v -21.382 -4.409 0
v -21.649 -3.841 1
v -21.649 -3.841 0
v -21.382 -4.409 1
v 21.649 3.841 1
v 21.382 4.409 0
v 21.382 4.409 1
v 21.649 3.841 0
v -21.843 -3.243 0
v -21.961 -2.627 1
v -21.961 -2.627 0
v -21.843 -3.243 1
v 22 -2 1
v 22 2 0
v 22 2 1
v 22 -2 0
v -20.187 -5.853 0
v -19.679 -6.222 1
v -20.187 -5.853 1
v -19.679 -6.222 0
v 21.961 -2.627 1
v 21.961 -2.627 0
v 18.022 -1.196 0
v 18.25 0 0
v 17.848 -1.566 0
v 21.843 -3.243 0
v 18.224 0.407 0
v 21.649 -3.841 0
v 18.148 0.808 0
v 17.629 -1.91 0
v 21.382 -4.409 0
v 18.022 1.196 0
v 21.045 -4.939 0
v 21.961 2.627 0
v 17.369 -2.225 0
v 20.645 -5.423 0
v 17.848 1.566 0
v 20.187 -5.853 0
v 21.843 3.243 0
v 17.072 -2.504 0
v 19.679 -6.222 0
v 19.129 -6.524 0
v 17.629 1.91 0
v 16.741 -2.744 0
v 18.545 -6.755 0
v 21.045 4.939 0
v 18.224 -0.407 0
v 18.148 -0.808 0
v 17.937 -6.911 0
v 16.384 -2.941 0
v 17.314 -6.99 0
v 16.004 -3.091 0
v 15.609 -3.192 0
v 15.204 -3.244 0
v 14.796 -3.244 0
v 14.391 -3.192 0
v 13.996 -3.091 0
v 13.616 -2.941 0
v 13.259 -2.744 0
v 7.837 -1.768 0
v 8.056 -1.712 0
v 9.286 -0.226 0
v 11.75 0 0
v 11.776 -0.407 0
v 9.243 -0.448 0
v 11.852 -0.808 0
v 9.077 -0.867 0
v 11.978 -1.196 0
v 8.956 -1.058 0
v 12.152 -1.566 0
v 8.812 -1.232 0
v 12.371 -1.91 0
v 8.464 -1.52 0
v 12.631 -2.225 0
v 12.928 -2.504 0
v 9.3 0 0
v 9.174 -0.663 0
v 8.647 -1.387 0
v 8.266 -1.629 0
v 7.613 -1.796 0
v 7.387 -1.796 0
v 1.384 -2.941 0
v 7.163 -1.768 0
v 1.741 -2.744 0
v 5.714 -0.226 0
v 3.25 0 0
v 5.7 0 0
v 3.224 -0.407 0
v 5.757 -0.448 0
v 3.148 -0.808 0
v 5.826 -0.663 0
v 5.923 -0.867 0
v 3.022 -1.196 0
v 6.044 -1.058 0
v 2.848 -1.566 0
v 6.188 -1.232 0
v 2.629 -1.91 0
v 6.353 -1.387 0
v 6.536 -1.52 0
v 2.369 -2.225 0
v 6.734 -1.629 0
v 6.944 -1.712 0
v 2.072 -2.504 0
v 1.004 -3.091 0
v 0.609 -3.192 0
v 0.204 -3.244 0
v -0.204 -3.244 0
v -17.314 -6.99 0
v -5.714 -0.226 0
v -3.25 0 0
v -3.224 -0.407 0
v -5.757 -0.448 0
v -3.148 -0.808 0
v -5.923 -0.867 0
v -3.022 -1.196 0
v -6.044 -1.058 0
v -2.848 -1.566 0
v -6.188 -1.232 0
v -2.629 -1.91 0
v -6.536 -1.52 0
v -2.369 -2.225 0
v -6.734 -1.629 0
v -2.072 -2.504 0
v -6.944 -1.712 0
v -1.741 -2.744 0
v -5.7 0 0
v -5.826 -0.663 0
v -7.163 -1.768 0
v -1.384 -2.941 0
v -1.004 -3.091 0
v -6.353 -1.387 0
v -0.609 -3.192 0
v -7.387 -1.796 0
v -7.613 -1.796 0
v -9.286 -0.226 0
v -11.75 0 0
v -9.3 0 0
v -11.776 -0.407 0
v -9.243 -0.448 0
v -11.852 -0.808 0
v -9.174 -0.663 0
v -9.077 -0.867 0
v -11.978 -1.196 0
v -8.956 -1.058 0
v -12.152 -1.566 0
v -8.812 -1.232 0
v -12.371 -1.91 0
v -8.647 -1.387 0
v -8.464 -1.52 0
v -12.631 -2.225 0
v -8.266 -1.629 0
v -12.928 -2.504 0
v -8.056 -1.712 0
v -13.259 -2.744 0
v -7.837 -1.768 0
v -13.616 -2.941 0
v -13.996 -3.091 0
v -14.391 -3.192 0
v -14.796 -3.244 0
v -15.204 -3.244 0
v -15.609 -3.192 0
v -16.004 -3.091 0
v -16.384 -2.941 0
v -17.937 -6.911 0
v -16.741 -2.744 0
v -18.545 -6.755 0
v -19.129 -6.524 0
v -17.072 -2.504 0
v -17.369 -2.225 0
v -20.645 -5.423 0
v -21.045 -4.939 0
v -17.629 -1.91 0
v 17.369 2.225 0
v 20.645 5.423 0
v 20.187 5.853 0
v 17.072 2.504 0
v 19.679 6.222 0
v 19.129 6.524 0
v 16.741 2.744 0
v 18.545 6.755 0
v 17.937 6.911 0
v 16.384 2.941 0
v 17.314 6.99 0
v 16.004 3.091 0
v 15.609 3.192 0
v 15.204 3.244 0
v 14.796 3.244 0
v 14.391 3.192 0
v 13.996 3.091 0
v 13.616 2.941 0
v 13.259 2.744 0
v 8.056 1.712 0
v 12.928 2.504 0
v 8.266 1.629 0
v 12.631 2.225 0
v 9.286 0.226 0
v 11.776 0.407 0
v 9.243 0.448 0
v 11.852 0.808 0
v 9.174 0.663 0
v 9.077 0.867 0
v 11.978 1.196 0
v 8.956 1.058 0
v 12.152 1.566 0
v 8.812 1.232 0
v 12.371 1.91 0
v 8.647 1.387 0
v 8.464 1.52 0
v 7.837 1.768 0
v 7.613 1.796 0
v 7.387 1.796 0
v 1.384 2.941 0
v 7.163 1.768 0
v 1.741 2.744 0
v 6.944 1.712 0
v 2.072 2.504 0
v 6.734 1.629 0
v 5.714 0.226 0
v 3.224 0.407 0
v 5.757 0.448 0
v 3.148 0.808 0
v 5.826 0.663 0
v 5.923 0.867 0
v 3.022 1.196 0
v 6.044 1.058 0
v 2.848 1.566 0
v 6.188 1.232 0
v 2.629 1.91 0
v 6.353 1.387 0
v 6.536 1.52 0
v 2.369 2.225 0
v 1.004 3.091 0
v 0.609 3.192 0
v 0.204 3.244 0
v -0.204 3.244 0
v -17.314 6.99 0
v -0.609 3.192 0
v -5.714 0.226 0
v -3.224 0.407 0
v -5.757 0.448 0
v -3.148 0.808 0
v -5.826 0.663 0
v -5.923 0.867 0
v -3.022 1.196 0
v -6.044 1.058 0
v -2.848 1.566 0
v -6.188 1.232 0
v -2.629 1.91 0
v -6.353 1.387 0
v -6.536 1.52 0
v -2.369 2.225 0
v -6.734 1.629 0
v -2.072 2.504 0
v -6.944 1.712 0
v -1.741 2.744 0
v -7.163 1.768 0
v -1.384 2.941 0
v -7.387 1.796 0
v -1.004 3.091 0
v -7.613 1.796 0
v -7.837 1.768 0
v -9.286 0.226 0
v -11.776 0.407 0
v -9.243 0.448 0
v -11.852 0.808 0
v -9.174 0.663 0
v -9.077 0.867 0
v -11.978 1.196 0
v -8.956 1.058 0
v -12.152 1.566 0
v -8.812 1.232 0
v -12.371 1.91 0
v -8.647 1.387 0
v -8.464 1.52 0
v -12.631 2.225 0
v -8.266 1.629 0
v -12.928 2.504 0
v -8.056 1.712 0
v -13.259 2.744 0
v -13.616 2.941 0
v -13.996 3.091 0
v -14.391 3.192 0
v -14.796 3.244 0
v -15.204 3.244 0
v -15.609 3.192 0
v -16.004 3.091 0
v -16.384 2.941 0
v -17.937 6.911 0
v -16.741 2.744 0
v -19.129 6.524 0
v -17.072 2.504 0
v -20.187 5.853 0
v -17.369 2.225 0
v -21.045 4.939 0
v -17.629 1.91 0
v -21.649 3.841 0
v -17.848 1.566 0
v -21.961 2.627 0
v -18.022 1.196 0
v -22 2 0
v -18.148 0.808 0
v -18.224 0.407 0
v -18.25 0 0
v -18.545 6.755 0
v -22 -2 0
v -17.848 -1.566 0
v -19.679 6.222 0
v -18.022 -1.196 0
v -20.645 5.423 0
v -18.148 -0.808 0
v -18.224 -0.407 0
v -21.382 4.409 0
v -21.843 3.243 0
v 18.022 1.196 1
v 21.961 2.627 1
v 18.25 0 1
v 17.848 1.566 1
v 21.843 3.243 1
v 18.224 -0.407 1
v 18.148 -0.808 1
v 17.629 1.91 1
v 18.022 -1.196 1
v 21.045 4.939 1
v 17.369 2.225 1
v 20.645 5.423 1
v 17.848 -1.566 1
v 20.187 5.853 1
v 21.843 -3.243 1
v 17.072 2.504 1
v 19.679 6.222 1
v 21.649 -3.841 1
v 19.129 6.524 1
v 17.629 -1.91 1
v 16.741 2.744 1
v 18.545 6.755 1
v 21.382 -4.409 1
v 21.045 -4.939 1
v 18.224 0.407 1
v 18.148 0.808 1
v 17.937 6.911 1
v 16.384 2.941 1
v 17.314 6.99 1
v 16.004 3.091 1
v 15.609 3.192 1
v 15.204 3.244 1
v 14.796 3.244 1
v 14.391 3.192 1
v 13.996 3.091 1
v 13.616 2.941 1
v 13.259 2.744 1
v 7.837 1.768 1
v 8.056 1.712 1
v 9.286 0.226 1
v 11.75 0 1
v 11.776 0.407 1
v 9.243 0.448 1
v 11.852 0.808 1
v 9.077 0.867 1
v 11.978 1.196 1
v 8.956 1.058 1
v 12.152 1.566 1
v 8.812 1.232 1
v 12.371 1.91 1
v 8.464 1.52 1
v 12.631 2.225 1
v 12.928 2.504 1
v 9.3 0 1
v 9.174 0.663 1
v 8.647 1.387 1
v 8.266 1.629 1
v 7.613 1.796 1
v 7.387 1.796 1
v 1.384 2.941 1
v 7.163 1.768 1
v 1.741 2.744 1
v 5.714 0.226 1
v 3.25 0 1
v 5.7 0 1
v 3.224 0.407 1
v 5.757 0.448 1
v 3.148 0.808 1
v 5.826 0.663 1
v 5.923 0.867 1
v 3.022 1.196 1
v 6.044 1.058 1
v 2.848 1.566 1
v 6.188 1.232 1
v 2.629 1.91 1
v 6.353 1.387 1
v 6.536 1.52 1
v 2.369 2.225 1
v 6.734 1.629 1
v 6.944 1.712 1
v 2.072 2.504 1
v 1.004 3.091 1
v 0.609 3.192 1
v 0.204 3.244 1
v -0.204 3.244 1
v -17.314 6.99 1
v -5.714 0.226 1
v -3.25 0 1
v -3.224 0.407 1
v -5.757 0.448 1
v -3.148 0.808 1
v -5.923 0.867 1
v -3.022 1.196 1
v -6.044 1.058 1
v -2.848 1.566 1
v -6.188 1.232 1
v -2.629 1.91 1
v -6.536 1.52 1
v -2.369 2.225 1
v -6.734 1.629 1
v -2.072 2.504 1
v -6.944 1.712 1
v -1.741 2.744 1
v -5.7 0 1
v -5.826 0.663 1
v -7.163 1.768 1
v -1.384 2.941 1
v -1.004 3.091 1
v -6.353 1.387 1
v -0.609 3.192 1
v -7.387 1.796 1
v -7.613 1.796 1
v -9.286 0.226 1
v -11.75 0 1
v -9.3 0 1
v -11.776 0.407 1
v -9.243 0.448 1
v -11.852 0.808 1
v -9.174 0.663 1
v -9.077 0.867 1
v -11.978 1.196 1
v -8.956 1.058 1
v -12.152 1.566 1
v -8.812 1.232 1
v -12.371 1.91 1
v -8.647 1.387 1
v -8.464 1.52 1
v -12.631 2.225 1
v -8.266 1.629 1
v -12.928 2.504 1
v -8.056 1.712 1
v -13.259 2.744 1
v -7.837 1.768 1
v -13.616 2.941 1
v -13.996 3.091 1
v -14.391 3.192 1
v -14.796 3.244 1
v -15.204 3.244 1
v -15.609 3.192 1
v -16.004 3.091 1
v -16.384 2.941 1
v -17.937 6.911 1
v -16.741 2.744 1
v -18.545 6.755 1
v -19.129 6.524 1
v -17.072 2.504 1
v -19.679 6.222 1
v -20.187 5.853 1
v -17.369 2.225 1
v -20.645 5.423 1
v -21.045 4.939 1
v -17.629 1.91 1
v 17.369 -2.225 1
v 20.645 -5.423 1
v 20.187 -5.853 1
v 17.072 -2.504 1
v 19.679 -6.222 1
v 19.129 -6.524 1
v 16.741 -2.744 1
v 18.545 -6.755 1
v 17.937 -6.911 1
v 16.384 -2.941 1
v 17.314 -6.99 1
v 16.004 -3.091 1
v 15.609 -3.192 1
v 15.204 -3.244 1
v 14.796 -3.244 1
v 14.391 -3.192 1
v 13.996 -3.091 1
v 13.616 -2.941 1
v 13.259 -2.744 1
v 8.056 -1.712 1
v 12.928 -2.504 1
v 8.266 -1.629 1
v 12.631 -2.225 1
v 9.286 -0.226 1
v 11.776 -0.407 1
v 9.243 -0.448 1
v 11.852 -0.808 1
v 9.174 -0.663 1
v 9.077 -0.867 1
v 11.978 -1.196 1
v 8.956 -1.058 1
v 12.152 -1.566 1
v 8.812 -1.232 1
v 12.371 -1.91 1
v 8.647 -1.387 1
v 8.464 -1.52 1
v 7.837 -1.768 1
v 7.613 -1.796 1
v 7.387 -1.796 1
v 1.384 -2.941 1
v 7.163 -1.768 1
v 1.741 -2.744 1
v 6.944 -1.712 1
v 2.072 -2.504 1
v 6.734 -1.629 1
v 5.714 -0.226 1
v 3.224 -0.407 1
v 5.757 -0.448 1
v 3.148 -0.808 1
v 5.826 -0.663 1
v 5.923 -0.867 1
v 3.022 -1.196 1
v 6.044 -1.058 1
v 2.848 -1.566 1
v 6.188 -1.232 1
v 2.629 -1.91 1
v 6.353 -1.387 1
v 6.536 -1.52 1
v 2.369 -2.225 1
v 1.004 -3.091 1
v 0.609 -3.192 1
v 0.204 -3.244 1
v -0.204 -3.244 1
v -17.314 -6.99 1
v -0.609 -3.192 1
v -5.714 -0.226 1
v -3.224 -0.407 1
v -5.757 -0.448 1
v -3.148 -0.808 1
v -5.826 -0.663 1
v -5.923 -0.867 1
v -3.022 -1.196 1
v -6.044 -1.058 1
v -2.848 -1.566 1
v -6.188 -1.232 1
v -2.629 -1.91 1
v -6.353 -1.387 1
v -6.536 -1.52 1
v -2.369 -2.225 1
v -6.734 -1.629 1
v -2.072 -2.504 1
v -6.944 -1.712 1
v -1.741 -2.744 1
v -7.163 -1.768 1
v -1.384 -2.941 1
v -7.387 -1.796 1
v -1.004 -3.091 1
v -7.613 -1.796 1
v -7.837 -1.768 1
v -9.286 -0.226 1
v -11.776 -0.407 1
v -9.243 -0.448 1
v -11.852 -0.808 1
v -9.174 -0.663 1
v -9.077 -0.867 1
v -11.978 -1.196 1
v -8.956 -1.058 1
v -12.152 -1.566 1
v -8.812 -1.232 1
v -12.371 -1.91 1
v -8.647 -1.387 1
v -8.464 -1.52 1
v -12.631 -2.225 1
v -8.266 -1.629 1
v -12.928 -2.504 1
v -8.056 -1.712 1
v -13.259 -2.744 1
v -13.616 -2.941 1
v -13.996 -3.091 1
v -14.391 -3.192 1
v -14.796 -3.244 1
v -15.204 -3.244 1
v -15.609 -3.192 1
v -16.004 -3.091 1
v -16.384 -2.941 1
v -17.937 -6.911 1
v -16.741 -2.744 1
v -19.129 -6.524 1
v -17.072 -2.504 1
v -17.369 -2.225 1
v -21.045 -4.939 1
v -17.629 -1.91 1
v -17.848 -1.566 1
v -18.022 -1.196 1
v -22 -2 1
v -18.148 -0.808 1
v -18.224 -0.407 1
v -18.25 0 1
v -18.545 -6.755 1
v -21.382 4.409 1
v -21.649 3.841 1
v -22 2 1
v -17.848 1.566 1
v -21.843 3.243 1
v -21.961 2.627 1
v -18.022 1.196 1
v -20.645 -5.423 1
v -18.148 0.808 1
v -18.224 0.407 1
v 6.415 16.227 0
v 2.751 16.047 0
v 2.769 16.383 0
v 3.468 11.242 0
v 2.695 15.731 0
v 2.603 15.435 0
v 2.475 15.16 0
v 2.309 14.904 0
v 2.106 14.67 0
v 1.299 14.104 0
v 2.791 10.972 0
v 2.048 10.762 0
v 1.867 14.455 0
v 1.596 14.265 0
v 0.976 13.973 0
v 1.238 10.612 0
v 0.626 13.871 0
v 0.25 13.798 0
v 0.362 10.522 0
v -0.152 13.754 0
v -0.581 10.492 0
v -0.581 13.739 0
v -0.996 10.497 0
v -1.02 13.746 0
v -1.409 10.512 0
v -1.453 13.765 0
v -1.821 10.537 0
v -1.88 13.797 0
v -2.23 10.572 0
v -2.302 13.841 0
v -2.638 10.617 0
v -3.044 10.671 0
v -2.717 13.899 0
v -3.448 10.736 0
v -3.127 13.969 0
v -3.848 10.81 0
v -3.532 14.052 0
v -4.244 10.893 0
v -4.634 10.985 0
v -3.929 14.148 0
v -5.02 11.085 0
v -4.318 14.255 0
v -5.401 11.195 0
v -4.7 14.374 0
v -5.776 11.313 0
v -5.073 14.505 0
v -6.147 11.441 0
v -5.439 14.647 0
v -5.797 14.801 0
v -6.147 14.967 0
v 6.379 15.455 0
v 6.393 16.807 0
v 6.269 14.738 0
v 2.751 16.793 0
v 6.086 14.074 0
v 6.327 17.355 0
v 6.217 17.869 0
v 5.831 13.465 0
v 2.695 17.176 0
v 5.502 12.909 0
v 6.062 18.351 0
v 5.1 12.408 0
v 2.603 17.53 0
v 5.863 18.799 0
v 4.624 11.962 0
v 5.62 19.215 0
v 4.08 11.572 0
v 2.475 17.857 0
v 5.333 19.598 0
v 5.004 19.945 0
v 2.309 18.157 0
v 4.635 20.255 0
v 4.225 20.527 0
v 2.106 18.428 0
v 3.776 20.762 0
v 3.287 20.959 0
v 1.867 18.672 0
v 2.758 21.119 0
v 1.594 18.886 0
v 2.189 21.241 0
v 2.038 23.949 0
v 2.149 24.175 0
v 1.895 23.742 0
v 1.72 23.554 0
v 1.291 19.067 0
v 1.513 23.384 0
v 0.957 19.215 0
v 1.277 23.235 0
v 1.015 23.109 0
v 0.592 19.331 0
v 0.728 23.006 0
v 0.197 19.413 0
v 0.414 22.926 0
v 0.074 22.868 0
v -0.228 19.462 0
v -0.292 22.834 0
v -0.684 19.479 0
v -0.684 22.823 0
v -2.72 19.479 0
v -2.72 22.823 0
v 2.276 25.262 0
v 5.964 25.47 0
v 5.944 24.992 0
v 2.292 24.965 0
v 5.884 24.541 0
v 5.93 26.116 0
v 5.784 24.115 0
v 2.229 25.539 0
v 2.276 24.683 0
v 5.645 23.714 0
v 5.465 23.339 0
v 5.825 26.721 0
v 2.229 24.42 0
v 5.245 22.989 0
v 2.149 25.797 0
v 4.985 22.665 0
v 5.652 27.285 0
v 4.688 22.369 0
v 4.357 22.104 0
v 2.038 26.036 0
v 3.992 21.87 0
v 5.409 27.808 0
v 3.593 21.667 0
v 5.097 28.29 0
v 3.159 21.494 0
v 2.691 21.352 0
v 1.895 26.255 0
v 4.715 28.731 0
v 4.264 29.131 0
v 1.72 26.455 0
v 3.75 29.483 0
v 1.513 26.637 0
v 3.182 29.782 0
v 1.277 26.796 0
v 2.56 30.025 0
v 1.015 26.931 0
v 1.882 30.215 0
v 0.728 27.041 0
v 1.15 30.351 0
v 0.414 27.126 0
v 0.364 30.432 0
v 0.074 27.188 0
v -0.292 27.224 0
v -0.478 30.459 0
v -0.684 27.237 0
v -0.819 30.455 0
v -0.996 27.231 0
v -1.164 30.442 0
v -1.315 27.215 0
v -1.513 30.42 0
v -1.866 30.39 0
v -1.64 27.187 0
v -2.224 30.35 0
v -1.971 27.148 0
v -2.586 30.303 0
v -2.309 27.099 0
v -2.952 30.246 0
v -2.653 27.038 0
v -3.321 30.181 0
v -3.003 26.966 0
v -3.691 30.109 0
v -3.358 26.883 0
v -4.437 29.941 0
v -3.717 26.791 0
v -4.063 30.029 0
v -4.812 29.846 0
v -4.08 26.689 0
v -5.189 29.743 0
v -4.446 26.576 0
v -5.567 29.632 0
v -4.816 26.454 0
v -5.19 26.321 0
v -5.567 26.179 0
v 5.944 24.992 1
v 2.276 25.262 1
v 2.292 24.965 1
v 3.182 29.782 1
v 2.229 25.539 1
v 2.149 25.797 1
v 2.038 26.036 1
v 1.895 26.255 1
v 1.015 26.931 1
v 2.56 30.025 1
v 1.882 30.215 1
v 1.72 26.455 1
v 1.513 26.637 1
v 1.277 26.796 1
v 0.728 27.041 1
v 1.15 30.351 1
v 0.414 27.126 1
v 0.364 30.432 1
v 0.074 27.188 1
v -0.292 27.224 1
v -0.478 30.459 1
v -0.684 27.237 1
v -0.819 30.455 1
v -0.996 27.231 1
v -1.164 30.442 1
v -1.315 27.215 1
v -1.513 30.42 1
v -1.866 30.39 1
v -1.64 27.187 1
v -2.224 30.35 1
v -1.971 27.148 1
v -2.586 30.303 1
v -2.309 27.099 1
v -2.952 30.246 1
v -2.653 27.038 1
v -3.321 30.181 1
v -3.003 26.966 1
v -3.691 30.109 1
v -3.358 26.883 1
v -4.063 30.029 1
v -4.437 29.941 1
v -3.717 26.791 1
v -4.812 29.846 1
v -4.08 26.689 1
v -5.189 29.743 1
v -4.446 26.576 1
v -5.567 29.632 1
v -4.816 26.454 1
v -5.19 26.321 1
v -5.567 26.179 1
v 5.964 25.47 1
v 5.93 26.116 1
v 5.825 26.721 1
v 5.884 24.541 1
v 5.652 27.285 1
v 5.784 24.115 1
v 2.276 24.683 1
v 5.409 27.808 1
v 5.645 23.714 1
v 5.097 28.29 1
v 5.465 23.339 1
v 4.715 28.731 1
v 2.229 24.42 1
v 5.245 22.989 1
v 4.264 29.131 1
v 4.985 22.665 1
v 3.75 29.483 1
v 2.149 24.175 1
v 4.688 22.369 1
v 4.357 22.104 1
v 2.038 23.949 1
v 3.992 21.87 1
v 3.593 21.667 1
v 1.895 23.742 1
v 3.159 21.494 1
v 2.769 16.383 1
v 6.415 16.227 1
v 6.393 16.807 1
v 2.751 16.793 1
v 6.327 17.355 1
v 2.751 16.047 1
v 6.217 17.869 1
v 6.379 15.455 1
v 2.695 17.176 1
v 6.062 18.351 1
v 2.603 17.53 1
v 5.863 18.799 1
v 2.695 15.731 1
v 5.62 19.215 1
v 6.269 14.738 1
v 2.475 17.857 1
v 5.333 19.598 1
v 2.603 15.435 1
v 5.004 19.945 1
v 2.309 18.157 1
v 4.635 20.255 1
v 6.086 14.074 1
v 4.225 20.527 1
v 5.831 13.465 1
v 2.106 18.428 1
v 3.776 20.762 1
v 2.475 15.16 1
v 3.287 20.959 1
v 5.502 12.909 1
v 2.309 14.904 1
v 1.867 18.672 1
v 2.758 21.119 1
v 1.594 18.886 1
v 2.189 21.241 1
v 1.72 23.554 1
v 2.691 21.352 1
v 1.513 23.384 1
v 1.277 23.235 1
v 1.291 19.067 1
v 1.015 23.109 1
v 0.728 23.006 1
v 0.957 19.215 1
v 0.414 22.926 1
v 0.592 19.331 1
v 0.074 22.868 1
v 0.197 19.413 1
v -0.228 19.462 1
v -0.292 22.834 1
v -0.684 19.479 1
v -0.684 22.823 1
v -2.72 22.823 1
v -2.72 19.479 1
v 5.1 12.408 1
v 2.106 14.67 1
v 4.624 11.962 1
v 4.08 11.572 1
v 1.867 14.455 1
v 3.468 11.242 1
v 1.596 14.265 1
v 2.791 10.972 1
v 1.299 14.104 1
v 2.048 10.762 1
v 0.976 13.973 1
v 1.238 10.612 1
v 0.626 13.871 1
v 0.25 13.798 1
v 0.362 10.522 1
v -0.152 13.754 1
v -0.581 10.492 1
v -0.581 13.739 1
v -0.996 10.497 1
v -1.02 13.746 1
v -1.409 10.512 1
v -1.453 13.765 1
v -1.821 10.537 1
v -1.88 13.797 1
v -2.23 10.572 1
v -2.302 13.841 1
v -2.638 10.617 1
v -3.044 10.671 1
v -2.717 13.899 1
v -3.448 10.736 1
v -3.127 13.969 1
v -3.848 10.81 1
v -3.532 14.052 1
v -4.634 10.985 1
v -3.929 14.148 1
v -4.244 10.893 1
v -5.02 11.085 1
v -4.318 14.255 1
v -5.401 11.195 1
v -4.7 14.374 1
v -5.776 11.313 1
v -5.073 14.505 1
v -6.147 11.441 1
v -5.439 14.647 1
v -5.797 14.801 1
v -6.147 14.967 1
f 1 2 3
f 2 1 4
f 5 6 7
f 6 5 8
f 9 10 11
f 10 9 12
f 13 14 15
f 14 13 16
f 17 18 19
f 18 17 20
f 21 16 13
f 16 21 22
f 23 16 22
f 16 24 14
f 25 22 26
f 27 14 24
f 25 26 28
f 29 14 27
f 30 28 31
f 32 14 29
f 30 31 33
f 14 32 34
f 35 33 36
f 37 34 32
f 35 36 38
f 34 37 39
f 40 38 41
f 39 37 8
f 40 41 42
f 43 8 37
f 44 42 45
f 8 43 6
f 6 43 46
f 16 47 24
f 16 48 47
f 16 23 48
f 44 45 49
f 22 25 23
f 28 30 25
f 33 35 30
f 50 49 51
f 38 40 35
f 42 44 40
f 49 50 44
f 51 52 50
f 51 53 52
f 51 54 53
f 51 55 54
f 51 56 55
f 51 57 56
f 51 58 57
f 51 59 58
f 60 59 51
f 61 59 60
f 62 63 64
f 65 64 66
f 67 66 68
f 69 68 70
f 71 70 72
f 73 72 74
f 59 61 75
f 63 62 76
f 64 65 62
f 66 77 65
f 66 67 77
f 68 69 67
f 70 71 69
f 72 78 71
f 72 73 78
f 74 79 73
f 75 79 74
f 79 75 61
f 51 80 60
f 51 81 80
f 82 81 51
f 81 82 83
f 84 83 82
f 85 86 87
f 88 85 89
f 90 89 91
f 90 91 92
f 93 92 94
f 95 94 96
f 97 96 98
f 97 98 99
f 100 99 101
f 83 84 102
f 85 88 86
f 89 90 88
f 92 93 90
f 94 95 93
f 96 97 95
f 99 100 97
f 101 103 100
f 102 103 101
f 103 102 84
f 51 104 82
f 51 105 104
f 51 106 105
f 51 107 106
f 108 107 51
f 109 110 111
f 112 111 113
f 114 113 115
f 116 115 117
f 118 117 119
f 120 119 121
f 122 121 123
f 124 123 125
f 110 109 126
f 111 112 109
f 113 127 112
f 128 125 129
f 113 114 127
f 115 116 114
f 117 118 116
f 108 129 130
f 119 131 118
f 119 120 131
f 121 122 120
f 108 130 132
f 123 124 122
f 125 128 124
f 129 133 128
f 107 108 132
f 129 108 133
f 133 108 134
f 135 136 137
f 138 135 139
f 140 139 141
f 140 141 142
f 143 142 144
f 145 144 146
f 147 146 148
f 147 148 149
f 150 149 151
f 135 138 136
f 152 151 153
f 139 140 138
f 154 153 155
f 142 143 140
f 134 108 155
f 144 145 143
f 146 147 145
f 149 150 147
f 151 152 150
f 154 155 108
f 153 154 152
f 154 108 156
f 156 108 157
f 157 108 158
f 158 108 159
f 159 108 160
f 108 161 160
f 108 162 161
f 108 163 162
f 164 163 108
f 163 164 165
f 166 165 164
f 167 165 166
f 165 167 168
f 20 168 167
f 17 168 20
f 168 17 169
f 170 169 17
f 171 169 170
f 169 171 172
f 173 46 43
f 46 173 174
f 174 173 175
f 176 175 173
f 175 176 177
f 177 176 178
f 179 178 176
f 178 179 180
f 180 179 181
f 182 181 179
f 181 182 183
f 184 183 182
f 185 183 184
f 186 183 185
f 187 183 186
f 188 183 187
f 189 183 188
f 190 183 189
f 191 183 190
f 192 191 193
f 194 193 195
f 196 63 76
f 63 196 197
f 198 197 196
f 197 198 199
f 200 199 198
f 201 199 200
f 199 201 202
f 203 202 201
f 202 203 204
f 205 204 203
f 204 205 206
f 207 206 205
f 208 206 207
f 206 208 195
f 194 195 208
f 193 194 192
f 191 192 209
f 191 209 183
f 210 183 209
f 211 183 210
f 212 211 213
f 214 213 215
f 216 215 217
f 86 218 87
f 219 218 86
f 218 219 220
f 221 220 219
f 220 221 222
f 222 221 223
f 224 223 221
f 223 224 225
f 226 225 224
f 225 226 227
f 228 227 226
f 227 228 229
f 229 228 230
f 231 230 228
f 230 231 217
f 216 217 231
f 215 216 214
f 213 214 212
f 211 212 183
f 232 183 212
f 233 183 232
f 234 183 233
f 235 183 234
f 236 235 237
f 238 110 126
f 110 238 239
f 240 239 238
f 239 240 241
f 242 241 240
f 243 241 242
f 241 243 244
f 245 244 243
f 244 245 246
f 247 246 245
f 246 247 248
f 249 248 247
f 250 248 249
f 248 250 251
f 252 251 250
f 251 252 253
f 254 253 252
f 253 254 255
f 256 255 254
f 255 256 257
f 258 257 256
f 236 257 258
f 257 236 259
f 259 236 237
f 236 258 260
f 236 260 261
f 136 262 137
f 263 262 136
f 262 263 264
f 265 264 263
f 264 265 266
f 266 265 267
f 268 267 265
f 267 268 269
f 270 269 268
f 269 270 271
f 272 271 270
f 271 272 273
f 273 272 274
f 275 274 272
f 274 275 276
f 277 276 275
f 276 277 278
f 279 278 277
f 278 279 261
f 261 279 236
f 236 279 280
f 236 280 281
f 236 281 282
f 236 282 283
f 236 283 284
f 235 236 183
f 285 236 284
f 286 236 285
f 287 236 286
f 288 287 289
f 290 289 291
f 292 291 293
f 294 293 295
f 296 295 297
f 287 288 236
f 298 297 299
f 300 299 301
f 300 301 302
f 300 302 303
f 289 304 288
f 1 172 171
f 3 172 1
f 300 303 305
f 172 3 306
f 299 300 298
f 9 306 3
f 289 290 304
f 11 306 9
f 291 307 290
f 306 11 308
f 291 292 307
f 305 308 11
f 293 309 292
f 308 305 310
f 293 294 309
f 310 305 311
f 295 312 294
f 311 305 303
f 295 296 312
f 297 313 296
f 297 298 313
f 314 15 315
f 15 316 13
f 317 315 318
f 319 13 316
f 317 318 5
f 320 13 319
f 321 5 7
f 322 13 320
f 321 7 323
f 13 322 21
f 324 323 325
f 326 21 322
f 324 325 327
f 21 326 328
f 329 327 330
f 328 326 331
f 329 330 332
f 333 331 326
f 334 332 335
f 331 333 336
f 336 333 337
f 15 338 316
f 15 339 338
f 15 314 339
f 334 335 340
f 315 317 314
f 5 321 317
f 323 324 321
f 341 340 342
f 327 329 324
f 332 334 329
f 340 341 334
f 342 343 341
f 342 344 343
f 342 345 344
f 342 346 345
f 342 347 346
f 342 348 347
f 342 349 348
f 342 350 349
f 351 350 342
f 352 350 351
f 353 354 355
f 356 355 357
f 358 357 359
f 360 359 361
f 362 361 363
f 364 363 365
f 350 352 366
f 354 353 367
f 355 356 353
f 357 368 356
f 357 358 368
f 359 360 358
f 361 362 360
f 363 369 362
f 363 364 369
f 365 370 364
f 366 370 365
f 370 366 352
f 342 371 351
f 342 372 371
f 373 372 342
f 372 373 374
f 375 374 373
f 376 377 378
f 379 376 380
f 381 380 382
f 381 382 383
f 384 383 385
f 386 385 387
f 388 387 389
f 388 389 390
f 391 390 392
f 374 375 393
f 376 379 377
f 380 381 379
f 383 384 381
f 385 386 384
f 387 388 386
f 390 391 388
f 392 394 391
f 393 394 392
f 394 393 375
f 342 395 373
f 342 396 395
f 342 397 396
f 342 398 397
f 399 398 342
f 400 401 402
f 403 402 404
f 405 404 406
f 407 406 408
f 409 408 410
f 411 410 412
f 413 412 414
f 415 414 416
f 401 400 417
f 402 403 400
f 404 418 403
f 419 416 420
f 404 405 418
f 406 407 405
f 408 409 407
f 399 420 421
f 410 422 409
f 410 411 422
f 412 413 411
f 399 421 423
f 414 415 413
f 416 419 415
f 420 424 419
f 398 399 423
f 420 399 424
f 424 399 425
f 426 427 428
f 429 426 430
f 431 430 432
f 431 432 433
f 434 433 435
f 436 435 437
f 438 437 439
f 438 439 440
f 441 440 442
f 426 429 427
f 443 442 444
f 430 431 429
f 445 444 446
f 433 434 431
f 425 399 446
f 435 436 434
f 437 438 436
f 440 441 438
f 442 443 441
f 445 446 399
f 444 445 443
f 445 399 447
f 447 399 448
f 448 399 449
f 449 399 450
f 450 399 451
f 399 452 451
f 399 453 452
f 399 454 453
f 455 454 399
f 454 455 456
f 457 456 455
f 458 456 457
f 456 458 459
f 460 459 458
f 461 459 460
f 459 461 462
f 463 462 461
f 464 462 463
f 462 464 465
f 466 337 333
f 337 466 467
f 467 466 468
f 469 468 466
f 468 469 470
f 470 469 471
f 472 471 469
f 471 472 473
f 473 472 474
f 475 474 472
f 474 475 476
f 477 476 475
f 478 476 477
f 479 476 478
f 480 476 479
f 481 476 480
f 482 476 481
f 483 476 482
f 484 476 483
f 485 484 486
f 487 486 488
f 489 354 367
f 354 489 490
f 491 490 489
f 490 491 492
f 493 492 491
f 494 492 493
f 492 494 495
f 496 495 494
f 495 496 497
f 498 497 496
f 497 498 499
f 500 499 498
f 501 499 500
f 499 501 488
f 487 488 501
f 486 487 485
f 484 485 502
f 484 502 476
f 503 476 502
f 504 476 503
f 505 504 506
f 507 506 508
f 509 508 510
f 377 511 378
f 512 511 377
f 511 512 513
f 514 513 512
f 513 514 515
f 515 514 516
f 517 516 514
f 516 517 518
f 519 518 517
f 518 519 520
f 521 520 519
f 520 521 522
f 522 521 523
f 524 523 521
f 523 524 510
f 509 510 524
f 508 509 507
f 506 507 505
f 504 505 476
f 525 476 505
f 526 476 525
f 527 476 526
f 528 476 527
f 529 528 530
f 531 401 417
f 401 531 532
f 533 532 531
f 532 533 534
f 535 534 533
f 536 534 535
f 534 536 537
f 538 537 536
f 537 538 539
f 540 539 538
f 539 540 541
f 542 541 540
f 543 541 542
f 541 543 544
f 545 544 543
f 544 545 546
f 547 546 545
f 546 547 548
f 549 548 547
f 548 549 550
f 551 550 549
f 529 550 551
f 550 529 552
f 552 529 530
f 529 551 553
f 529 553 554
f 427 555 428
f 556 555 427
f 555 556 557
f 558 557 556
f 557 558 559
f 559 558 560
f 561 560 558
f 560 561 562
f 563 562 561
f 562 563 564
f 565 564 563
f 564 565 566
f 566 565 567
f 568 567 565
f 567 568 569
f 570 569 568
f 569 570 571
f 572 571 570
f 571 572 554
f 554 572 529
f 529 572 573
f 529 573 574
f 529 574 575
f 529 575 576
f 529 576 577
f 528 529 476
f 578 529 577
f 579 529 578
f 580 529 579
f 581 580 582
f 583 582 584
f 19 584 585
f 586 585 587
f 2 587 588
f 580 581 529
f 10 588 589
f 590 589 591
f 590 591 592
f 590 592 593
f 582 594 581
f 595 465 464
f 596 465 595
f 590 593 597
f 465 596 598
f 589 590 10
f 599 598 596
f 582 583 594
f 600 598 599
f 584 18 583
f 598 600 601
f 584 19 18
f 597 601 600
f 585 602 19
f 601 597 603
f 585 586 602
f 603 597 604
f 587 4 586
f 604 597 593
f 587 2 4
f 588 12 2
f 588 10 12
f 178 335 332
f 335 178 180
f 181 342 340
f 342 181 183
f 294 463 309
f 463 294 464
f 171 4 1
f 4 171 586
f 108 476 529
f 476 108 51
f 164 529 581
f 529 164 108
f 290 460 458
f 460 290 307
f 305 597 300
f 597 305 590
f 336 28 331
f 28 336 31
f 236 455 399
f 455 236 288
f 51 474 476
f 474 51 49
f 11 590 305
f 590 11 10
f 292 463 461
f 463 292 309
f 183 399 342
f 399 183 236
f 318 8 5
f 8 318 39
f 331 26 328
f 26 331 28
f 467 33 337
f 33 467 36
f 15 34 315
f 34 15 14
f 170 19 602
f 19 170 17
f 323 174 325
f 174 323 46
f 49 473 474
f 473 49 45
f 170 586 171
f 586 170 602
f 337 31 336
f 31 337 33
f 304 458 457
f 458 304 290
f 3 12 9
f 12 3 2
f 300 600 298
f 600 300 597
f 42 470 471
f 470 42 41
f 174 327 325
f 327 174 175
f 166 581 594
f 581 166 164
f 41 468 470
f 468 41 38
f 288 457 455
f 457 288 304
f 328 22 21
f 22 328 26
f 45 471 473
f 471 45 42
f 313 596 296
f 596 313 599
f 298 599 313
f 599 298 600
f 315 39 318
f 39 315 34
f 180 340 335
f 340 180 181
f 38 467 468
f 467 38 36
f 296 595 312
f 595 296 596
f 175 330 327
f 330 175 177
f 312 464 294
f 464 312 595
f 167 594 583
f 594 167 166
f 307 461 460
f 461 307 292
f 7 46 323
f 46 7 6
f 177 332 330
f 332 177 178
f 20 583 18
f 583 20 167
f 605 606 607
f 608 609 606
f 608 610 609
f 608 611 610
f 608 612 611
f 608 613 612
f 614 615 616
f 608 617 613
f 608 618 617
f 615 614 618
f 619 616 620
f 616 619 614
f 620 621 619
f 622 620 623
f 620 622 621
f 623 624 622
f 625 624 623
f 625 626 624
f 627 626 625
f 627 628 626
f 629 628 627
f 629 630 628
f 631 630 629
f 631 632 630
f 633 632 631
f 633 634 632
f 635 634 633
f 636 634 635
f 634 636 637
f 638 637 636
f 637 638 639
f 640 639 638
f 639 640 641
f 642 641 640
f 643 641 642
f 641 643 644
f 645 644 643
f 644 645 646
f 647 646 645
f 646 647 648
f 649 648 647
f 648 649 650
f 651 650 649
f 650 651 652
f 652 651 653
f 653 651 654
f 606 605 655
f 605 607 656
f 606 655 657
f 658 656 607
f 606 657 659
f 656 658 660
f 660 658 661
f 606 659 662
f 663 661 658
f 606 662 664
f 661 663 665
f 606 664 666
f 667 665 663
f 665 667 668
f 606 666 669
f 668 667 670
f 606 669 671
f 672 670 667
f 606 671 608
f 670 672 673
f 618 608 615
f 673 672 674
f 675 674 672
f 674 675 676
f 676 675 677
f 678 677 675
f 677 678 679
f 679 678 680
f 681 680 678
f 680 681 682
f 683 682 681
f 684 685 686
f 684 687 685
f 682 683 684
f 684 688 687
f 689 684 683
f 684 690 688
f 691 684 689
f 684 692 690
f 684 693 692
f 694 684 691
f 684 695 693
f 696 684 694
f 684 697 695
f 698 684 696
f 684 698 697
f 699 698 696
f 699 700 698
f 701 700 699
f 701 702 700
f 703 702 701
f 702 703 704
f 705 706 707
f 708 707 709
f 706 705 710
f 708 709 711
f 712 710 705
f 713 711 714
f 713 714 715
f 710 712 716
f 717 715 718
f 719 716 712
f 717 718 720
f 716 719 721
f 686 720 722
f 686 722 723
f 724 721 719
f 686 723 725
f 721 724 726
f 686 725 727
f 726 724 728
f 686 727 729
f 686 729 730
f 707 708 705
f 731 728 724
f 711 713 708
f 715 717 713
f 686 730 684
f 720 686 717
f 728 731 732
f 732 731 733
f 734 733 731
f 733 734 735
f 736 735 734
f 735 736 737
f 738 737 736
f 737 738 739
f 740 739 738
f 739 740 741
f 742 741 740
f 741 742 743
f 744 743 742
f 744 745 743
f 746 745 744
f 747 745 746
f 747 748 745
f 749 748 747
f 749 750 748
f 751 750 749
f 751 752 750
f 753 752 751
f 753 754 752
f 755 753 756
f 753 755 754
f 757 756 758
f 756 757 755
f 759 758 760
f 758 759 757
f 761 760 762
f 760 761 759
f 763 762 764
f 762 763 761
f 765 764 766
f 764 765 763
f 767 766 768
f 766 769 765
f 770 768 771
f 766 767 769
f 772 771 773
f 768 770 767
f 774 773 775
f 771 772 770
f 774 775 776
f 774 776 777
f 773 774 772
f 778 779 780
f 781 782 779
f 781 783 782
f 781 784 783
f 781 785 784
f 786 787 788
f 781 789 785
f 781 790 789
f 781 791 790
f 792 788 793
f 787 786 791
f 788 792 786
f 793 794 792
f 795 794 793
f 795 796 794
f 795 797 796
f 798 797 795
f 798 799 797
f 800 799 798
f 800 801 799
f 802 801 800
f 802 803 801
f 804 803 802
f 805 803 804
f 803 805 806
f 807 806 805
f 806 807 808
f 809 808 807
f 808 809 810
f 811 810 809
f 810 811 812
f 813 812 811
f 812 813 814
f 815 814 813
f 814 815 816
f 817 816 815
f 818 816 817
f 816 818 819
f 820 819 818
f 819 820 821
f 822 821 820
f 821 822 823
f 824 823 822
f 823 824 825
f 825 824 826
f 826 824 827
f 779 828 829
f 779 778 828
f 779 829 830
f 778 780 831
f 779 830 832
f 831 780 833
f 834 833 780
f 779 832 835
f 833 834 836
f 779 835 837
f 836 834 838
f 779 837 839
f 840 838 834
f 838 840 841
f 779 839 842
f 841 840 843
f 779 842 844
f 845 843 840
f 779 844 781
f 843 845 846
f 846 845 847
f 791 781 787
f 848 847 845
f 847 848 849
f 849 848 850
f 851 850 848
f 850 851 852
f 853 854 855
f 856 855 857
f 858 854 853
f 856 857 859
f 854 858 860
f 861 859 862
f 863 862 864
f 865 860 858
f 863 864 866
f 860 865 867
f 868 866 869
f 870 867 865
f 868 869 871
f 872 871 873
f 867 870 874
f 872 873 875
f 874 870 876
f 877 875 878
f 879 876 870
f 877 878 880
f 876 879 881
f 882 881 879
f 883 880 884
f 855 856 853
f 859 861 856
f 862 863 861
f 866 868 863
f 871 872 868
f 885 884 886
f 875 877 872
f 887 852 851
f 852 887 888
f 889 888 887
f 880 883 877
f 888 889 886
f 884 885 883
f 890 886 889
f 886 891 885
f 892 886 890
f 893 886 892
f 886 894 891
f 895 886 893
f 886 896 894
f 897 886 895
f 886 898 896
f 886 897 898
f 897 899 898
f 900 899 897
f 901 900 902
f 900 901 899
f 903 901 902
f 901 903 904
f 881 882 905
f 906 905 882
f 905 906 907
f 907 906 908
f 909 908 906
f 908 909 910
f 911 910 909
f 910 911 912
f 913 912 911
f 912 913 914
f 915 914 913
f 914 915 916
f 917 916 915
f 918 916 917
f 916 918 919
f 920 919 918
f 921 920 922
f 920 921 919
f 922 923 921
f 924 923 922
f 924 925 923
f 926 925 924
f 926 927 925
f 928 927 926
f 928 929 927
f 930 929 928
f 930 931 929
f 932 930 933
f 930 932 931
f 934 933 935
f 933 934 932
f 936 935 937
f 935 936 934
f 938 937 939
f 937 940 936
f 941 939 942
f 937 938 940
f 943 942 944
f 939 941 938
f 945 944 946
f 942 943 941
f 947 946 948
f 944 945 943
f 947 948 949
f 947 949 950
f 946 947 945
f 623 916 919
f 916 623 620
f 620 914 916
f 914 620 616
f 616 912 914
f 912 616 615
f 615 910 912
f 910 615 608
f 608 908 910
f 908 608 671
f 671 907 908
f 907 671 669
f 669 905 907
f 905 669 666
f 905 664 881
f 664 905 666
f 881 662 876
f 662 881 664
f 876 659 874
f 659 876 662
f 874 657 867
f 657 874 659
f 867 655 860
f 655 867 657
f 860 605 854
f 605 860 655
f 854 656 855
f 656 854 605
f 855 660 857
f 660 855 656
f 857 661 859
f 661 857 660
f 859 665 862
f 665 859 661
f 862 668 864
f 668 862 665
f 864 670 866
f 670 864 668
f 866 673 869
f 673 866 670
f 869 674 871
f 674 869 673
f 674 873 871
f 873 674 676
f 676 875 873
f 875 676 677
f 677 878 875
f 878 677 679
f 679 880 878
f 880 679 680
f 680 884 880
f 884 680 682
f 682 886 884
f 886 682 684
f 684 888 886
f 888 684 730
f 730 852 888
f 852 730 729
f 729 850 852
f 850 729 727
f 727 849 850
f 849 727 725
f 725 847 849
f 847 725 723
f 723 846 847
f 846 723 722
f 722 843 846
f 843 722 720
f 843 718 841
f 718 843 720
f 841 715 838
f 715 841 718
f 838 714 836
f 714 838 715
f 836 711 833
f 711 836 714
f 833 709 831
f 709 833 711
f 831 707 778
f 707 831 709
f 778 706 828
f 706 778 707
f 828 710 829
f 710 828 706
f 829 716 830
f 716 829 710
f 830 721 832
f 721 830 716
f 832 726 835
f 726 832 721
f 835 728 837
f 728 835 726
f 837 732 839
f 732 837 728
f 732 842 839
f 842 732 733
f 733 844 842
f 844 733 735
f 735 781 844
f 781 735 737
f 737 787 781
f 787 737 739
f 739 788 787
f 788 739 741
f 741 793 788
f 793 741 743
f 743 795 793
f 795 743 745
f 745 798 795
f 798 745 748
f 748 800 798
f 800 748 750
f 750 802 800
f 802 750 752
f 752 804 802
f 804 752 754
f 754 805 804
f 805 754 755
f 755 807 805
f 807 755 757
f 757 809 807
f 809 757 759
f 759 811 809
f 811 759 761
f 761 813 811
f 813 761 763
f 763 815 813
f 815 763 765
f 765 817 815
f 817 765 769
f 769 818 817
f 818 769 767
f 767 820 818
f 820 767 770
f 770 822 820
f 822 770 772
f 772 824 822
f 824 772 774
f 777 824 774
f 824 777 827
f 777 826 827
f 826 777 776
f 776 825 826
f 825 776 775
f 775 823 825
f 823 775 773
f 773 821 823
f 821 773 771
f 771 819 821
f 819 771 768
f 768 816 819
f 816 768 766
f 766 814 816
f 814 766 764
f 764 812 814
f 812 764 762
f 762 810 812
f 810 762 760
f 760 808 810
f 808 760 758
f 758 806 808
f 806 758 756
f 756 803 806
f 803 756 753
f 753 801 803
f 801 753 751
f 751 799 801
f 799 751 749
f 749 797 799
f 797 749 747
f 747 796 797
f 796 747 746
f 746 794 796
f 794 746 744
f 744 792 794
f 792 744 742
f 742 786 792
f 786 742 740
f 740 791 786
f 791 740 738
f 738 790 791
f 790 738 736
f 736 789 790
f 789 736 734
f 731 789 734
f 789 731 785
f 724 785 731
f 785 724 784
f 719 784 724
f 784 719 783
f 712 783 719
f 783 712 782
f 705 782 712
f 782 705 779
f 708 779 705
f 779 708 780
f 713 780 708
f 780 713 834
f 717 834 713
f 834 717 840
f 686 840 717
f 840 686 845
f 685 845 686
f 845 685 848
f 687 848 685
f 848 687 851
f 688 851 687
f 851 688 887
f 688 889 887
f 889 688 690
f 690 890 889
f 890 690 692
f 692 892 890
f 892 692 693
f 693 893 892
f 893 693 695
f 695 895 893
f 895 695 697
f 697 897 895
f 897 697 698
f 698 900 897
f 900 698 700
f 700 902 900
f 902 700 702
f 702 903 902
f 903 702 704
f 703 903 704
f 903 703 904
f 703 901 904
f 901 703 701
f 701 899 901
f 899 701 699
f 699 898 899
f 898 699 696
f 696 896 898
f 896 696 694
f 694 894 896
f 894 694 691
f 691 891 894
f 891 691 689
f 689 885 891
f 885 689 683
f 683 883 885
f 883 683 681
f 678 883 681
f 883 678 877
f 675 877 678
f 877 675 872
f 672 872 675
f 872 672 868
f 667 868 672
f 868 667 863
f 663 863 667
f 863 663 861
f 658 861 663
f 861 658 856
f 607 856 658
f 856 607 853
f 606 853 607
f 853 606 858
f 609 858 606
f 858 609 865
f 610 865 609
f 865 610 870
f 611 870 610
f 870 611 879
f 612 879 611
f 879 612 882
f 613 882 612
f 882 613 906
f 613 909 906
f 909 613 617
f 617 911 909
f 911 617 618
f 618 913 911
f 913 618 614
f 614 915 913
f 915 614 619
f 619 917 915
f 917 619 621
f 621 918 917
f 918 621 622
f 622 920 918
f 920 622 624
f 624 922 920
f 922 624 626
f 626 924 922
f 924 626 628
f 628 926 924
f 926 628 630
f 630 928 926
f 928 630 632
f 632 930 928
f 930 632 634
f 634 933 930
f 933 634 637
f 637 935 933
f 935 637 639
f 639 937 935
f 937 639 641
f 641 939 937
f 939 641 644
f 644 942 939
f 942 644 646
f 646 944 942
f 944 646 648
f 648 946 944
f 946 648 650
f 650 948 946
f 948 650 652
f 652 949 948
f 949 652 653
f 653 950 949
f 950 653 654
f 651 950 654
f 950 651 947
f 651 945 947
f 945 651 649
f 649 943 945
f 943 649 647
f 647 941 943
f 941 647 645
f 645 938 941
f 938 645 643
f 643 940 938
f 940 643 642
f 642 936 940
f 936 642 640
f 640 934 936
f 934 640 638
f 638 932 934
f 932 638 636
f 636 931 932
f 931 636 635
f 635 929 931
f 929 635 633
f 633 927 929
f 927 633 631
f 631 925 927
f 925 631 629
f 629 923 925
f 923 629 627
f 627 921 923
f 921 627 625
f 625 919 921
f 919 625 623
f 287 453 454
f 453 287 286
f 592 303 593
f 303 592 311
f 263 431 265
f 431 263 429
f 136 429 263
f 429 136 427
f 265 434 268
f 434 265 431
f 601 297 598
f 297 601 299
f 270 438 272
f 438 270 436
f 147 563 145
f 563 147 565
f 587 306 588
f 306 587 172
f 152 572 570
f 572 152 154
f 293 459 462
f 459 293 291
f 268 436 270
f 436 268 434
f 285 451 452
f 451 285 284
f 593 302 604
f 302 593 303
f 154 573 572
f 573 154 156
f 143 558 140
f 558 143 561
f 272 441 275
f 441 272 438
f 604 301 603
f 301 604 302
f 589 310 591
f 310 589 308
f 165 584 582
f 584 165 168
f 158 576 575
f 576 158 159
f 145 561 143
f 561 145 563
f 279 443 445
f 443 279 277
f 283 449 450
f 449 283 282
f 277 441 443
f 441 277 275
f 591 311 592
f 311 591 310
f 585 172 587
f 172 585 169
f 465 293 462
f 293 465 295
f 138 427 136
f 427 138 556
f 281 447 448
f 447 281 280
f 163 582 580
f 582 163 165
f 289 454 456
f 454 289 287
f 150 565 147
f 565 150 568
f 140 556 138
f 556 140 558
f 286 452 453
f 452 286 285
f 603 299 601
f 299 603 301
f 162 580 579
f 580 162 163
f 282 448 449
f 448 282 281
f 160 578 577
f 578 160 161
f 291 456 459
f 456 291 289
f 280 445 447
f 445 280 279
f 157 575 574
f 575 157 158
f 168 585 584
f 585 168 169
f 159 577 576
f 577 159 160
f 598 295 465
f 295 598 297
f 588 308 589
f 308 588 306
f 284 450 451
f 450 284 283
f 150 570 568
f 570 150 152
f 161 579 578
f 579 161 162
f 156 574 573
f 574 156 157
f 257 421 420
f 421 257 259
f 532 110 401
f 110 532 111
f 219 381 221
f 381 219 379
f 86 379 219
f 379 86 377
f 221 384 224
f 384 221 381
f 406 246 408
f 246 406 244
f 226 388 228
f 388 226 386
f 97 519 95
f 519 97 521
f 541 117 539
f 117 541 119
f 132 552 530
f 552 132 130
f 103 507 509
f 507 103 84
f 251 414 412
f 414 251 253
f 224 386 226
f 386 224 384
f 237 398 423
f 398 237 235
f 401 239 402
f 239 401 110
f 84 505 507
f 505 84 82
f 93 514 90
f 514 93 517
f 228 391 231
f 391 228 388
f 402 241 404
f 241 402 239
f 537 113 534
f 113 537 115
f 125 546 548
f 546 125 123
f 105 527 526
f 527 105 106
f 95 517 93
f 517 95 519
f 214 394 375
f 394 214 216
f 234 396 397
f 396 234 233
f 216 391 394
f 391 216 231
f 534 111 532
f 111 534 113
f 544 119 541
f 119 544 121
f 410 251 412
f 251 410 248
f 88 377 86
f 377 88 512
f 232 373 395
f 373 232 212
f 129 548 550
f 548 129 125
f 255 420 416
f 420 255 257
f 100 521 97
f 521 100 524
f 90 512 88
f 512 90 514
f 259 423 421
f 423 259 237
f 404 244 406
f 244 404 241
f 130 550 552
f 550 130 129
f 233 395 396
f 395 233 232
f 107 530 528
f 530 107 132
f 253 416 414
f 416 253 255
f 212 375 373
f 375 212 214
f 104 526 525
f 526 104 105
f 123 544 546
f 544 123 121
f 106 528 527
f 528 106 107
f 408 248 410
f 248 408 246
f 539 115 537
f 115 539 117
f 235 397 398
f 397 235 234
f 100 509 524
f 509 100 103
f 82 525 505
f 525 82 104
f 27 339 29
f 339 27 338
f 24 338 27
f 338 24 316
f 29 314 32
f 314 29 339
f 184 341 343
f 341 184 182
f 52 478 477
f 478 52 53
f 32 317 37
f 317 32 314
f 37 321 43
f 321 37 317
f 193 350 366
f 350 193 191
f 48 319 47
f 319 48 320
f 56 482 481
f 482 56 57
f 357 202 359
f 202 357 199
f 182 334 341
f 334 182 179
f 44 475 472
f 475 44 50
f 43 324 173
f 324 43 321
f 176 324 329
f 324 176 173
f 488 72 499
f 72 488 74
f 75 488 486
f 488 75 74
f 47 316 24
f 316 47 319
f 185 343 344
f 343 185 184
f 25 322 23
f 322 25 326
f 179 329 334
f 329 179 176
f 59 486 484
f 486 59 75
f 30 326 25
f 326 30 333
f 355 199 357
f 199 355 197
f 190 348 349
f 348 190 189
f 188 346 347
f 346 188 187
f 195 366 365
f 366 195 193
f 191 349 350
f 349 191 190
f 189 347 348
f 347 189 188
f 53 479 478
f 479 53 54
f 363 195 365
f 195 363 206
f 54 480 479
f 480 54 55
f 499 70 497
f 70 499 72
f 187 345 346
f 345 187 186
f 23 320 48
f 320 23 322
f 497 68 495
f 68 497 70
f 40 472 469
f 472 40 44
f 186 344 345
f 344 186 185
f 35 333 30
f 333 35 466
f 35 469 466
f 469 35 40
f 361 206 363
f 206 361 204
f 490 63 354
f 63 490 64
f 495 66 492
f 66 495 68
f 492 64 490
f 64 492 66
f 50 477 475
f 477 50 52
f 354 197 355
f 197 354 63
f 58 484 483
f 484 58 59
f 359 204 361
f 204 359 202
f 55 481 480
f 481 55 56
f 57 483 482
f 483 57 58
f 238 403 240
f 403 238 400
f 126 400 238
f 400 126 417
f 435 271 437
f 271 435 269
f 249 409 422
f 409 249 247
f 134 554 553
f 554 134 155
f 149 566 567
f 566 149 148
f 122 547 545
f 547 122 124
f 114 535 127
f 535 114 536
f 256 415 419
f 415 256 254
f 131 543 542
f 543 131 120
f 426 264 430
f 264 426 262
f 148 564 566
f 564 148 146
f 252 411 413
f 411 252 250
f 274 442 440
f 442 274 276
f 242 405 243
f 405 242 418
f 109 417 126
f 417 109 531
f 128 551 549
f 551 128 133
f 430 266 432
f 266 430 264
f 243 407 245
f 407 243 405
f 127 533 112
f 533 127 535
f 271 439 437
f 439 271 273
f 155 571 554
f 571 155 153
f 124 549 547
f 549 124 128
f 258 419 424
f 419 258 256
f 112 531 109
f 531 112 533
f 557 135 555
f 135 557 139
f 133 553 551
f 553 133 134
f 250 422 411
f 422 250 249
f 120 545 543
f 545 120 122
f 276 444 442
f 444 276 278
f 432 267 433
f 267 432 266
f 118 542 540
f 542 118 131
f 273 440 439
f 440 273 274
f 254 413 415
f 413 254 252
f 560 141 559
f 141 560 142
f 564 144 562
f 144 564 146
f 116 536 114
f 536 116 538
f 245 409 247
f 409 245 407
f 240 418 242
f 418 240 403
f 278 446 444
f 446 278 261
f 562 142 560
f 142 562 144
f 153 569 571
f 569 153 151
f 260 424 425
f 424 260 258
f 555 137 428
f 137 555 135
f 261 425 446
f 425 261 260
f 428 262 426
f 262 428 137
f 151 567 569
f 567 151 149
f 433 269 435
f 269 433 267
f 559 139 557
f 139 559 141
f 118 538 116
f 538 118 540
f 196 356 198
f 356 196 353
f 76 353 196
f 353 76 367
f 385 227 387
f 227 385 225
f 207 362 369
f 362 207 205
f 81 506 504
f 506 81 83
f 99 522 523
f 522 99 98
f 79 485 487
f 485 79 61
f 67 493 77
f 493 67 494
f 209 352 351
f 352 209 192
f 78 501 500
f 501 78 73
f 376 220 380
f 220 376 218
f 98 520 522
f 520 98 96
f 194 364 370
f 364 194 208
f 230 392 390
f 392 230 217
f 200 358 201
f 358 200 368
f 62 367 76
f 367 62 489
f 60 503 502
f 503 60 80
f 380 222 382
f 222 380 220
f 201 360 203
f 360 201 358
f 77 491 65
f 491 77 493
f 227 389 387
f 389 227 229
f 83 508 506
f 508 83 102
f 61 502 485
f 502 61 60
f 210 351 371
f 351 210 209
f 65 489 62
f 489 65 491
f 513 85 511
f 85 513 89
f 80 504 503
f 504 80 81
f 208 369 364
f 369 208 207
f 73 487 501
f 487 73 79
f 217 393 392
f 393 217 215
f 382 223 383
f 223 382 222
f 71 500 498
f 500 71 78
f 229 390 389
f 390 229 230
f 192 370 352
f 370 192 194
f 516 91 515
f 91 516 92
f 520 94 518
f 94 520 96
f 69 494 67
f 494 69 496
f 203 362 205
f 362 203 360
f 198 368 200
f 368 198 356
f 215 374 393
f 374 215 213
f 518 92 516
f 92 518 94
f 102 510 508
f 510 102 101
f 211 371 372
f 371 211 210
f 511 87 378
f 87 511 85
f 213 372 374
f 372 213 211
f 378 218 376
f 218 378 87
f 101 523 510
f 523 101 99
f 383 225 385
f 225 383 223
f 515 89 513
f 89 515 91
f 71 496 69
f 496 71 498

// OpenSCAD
$fn = 50;


difference() {
	union() {
		hull() {
			translate(v = [-17.0000000000, 2.0000000000, 0]) {
				cylinder(h = 1, r = 5);
			}
			translate(v = [17.0000000000, 2.0000000000, 0]) {
				cylinder(h = 1, r = 5);
			}
			translate(v = [-17.0000000000, -2.0000000000, 0]) {
				cylinder(h = 1, r = 5);
			}
			translate(v = [17.0000000000, -2.0000000000, 0]) {
				cylinder(h = 1, r = 5);
			}
		}
		translate(v = [0, 30.0000000000, 0]) {
			linear_extrude(height = 1) {
				text(font = "DejaVu Sans Mono:style=Bold", halign = "center", size = 19.0000000000, text = "3", valign = "top");
			}
		}
	}
	union() {
		translate(v = [-15.0000000000, 0.0000000000, 0]) {
			translate(v = [0, 0, -100]) {
				cylinder(h = 200, r = 3.2500000000);
			}
		}
		translate(v = [0, 0, -100]) {
			cylinder(h = 200, r = 3.2500000000);
		}
		translate(v = [15.0000000000, 0.0000000000, 0]) {
			translate(v = [0, 0, -100]) {
				cylinder(h = 200, r = 3.2500000000);
			}
		}
		translate(v = [-15.0000000000, 0.0000000000, 0]) {
			translate(v = [0, 0, -100]) {
				cylinder(h = 200, r = 1.8000000000);
			}
		}
		translate(v = [-7.5000000000, 0.0000000000, 0]) {
			translate(v = [0, 0, -100]) {
				cylinder(h = 200, r = 1.8000000000);
			}
		}
		translate(v = [0, 0, -100]) {
			cylinder(h = 200, r = 1.8000000000);
		}
		translate(v = [7.5000000000, 0.0000000000, 0]) {
			translate(v = [0, 0, -100]) {
				cylinder(h = 200, r = 1.8000000000);
			}
		}
		translate(v = [15.0000000000, 0.0000000000, 0]) {
			translate(v = [0, 0, -100]) {
				cylinder(h = 200, r = 1.8000000000);
			}
		}
	}
}
